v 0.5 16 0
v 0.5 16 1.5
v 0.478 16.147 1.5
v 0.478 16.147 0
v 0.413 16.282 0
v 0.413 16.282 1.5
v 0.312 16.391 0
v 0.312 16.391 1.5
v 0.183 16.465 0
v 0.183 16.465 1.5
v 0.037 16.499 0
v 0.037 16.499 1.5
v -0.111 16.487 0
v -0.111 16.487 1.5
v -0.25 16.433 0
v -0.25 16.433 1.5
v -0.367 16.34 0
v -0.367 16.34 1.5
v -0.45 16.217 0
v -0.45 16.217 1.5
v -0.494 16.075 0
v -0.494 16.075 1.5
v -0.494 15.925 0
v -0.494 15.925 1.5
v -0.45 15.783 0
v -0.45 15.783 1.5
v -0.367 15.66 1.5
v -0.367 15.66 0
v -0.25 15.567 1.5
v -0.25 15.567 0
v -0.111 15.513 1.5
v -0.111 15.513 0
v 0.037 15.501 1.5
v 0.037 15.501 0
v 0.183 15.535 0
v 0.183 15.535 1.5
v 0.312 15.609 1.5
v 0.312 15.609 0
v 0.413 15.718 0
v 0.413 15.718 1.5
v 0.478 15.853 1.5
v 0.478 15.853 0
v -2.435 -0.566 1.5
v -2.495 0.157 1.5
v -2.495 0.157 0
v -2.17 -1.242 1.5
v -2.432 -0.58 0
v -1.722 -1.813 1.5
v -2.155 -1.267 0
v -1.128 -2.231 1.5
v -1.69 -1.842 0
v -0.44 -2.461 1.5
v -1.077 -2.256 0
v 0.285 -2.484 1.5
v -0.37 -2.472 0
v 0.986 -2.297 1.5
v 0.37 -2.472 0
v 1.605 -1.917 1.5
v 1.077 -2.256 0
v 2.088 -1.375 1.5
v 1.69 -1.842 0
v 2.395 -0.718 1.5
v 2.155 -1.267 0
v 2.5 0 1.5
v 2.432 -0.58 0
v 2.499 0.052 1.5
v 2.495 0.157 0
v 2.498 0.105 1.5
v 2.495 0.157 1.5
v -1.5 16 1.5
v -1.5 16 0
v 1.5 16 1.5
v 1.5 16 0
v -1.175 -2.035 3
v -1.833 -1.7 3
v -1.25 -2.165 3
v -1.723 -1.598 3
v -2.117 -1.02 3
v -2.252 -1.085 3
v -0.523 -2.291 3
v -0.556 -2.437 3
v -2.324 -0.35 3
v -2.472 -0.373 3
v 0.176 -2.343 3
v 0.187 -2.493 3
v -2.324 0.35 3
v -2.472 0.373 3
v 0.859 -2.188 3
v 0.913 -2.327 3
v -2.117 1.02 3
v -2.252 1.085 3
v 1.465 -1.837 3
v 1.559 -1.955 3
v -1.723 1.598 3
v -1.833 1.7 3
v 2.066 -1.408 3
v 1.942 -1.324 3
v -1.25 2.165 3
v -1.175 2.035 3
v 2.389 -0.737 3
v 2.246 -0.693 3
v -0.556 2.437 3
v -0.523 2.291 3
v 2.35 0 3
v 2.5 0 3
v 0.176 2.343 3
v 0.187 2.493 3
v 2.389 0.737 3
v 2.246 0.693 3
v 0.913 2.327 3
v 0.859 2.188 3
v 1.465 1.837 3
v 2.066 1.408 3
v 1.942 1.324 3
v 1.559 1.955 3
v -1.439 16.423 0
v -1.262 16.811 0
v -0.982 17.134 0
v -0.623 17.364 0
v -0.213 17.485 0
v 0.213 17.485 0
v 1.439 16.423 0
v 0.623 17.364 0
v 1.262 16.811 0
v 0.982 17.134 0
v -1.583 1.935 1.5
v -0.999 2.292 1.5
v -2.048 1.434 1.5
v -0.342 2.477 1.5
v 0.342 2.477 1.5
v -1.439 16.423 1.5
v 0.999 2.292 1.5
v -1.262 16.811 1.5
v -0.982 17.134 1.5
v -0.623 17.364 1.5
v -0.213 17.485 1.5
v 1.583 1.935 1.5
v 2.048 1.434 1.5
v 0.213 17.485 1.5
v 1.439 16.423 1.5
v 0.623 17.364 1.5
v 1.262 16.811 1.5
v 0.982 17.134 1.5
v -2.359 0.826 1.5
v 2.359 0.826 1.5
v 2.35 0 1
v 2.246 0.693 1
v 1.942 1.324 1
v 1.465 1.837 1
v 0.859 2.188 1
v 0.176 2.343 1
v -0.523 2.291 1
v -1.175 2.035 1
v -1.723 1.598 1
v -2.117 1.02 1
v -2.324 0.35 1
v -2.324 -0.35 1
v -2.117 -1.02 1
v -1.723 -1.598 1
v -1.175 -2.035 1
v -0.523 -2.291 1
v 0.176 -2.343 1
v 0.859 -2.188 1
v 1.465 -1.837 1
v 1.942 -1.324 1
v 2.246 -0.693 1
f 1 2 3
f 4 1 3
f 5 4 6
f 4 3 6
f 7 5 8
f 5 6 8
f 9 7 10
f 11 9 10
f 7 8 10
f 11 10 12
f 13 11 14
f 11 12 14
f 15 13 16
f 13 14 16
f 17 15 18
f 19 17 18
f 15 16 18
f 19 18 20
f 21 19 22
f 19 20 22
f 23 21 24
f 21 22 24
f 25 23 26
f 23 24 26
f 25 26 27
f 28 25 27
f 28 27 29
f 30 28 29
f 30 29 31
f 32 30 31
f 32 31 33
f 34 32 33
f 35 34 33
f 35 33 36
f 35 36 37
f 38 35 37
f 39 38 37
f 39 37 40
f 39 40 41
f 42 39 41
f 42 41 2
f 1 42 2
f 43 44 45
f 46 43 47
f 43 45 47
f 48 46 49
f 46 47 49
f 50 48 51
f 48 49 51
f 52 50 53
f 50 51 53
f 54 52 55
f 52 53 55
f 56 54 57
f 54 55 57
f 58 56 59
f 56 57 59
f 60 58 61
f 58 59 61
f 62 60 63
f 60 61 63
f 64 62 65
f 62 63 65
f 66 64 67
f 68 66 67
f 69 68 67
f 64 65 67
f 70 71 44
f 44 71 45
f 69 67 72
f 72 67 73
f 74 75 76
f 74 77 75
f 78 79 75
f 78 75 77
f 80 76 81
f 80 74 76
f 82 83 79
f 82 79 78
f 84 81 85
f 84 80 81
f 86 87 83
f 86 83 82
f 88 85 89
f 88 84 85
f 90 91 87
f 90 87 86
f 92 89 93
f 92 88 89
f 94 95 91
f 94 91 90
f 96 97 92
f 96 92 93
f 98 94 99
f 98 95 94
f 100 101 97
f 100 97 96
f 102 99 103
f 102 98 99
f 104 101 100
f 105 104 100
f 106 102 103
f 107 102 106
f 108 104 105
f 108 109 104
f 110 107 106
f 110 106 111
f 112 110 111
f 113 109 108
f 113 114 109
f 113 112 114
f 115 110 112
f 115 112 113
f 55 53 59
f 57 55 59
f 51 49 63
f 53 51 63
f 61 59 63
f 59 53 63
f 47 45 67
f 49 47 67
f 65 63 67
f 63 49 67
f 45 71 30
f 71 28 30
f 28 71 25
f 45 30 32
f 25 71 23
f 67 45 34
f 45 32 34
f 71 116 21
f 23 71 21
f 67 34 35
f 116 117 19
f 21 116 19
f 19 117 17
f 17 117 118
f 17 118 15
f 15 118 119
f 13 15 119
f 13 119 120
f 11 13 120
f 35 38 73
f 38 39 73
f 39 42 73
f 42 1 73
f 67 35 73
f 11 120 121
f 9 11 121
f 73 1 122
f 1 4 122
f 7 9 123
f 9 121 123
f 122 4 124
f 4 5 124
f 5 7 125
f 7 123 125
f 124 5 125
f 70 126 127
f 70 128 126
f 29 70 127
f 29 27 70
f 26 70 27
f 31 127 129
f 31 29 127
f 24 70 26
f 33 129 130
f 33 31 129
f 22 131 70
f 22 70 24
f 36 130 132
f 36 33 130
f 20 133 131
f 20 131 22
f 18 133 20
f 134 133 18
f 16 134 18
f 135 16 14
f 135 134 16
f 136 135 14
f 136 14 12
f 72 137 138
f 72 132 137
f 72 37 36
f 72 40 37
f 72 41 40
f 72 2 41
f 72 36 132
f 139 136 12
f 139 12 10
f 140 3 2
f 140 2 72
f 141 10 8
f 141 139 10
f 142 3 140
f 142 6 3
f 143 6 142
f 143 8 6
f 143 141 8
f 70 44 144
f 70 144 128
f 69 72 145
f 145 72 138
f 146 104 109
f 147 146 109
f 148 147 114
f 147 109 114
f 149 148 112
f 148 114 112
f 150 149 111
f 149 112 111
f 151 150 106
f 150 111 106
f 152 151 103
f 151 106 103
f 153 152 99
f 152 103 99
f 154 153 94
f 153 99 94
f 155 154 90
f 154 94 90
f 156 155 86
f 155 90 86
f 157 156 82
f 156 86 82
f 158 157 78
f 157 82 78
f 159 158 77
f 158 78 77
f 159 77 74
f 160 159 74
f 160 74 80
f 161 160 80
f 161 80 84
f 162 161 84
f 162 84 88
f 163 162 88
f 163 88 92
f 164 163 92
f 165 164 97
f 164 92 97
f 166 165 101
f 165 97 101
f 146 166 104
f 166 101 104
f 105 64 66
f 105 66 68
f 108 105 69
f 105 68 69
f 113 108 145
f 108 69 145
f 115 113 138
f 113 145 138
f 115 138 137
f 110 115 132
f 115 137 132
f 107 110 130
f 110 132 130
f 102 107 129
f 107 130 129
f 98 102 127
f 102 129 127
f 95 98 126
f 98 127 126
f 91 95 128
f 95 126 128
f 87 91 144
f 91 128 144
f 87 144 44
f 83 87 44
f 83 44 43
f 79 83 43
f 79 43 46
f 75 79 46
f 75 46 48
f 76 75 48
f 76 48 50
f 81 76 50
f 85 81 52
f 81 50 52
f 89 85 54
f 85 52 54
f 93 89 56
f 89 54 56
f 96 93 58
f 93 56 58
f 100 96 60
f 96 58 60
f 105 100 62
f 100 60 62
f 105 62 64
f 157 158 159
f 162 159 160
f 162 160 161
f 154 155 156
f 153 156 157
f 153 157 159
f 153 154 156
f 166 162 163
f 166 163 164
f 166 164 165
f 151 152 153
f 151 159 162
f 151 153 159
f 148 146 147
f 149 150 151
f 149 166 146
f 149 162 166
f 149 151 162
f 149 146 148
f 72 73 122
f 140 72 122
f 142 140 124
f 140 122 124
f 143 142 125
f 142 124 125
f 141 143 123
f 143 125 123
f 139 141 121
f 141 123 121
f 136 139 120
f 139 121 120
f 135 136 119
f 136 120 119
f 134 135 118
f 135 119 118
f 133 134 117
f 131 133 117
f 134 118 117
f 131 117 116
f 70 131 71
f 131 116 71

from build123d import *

# Parameters (mm, degrees)
BOSS_EXTRUDE1_DEPTH = 1.5
SKETCH2_R           = 2.5
BOSS_EXTRUDE2_DEPTH = 1.5
SKETCH3_R           = 2.35
CUT_EXTRUDE1_DEPTH  = 2
SKETCH4_R           = 0.5
CUT_EXTRUDE2_DEPTH  = 2


with BuildPart() as part:
    # Sketch1 → Boss-Extrude1 (new body)
    with BuildSketch(Plane.XY):
        with BuildLine():
            Line((-1.5, 16), (-2.495083503, 0.156710922))
            ThreePointArc((-2.495083503, 0.156710922), (0, -2.5), (2.495083503, 0.156710922))
            Line((2.495083503, 0.156710922), (1.5, 16))
            ThreePointArc((1.5, 16), (0, 17.5), (-1.5, 16))
        make_face()
    extrude(amount=BOSS_EXTRUDE1_DEPTH)

    # Sketch2 → Boss-Extrude2 (add)
    with BuildSketch(Plane.XY.offset(1.5)):
        Circle(SKETCH2_R)
    extrude(amount=BOSS_EXTRUDE2_DEPTH)

    # Sketch3 → Cut-Extrude1 (cut)
    with BuildSketch(Plane.XY.offset(3)):
        Circle(SKETCH3_R)
    extrude(amount=-CUT_EXTRUDE1_DEPTH, mode=Mode.SUBTRACT)

    # Sketch4 → Cut-Extrude2 (cut)
    with BuildSketch(Plane.XY.offset(1.5)):
        with Locations((0, 16)):
            Circle(SKETCH4_R)
    extrude(amount=-CUT_EXTRUDE2_DEPTH, mode=Mode.SUBTRACT)


solid = part.part
